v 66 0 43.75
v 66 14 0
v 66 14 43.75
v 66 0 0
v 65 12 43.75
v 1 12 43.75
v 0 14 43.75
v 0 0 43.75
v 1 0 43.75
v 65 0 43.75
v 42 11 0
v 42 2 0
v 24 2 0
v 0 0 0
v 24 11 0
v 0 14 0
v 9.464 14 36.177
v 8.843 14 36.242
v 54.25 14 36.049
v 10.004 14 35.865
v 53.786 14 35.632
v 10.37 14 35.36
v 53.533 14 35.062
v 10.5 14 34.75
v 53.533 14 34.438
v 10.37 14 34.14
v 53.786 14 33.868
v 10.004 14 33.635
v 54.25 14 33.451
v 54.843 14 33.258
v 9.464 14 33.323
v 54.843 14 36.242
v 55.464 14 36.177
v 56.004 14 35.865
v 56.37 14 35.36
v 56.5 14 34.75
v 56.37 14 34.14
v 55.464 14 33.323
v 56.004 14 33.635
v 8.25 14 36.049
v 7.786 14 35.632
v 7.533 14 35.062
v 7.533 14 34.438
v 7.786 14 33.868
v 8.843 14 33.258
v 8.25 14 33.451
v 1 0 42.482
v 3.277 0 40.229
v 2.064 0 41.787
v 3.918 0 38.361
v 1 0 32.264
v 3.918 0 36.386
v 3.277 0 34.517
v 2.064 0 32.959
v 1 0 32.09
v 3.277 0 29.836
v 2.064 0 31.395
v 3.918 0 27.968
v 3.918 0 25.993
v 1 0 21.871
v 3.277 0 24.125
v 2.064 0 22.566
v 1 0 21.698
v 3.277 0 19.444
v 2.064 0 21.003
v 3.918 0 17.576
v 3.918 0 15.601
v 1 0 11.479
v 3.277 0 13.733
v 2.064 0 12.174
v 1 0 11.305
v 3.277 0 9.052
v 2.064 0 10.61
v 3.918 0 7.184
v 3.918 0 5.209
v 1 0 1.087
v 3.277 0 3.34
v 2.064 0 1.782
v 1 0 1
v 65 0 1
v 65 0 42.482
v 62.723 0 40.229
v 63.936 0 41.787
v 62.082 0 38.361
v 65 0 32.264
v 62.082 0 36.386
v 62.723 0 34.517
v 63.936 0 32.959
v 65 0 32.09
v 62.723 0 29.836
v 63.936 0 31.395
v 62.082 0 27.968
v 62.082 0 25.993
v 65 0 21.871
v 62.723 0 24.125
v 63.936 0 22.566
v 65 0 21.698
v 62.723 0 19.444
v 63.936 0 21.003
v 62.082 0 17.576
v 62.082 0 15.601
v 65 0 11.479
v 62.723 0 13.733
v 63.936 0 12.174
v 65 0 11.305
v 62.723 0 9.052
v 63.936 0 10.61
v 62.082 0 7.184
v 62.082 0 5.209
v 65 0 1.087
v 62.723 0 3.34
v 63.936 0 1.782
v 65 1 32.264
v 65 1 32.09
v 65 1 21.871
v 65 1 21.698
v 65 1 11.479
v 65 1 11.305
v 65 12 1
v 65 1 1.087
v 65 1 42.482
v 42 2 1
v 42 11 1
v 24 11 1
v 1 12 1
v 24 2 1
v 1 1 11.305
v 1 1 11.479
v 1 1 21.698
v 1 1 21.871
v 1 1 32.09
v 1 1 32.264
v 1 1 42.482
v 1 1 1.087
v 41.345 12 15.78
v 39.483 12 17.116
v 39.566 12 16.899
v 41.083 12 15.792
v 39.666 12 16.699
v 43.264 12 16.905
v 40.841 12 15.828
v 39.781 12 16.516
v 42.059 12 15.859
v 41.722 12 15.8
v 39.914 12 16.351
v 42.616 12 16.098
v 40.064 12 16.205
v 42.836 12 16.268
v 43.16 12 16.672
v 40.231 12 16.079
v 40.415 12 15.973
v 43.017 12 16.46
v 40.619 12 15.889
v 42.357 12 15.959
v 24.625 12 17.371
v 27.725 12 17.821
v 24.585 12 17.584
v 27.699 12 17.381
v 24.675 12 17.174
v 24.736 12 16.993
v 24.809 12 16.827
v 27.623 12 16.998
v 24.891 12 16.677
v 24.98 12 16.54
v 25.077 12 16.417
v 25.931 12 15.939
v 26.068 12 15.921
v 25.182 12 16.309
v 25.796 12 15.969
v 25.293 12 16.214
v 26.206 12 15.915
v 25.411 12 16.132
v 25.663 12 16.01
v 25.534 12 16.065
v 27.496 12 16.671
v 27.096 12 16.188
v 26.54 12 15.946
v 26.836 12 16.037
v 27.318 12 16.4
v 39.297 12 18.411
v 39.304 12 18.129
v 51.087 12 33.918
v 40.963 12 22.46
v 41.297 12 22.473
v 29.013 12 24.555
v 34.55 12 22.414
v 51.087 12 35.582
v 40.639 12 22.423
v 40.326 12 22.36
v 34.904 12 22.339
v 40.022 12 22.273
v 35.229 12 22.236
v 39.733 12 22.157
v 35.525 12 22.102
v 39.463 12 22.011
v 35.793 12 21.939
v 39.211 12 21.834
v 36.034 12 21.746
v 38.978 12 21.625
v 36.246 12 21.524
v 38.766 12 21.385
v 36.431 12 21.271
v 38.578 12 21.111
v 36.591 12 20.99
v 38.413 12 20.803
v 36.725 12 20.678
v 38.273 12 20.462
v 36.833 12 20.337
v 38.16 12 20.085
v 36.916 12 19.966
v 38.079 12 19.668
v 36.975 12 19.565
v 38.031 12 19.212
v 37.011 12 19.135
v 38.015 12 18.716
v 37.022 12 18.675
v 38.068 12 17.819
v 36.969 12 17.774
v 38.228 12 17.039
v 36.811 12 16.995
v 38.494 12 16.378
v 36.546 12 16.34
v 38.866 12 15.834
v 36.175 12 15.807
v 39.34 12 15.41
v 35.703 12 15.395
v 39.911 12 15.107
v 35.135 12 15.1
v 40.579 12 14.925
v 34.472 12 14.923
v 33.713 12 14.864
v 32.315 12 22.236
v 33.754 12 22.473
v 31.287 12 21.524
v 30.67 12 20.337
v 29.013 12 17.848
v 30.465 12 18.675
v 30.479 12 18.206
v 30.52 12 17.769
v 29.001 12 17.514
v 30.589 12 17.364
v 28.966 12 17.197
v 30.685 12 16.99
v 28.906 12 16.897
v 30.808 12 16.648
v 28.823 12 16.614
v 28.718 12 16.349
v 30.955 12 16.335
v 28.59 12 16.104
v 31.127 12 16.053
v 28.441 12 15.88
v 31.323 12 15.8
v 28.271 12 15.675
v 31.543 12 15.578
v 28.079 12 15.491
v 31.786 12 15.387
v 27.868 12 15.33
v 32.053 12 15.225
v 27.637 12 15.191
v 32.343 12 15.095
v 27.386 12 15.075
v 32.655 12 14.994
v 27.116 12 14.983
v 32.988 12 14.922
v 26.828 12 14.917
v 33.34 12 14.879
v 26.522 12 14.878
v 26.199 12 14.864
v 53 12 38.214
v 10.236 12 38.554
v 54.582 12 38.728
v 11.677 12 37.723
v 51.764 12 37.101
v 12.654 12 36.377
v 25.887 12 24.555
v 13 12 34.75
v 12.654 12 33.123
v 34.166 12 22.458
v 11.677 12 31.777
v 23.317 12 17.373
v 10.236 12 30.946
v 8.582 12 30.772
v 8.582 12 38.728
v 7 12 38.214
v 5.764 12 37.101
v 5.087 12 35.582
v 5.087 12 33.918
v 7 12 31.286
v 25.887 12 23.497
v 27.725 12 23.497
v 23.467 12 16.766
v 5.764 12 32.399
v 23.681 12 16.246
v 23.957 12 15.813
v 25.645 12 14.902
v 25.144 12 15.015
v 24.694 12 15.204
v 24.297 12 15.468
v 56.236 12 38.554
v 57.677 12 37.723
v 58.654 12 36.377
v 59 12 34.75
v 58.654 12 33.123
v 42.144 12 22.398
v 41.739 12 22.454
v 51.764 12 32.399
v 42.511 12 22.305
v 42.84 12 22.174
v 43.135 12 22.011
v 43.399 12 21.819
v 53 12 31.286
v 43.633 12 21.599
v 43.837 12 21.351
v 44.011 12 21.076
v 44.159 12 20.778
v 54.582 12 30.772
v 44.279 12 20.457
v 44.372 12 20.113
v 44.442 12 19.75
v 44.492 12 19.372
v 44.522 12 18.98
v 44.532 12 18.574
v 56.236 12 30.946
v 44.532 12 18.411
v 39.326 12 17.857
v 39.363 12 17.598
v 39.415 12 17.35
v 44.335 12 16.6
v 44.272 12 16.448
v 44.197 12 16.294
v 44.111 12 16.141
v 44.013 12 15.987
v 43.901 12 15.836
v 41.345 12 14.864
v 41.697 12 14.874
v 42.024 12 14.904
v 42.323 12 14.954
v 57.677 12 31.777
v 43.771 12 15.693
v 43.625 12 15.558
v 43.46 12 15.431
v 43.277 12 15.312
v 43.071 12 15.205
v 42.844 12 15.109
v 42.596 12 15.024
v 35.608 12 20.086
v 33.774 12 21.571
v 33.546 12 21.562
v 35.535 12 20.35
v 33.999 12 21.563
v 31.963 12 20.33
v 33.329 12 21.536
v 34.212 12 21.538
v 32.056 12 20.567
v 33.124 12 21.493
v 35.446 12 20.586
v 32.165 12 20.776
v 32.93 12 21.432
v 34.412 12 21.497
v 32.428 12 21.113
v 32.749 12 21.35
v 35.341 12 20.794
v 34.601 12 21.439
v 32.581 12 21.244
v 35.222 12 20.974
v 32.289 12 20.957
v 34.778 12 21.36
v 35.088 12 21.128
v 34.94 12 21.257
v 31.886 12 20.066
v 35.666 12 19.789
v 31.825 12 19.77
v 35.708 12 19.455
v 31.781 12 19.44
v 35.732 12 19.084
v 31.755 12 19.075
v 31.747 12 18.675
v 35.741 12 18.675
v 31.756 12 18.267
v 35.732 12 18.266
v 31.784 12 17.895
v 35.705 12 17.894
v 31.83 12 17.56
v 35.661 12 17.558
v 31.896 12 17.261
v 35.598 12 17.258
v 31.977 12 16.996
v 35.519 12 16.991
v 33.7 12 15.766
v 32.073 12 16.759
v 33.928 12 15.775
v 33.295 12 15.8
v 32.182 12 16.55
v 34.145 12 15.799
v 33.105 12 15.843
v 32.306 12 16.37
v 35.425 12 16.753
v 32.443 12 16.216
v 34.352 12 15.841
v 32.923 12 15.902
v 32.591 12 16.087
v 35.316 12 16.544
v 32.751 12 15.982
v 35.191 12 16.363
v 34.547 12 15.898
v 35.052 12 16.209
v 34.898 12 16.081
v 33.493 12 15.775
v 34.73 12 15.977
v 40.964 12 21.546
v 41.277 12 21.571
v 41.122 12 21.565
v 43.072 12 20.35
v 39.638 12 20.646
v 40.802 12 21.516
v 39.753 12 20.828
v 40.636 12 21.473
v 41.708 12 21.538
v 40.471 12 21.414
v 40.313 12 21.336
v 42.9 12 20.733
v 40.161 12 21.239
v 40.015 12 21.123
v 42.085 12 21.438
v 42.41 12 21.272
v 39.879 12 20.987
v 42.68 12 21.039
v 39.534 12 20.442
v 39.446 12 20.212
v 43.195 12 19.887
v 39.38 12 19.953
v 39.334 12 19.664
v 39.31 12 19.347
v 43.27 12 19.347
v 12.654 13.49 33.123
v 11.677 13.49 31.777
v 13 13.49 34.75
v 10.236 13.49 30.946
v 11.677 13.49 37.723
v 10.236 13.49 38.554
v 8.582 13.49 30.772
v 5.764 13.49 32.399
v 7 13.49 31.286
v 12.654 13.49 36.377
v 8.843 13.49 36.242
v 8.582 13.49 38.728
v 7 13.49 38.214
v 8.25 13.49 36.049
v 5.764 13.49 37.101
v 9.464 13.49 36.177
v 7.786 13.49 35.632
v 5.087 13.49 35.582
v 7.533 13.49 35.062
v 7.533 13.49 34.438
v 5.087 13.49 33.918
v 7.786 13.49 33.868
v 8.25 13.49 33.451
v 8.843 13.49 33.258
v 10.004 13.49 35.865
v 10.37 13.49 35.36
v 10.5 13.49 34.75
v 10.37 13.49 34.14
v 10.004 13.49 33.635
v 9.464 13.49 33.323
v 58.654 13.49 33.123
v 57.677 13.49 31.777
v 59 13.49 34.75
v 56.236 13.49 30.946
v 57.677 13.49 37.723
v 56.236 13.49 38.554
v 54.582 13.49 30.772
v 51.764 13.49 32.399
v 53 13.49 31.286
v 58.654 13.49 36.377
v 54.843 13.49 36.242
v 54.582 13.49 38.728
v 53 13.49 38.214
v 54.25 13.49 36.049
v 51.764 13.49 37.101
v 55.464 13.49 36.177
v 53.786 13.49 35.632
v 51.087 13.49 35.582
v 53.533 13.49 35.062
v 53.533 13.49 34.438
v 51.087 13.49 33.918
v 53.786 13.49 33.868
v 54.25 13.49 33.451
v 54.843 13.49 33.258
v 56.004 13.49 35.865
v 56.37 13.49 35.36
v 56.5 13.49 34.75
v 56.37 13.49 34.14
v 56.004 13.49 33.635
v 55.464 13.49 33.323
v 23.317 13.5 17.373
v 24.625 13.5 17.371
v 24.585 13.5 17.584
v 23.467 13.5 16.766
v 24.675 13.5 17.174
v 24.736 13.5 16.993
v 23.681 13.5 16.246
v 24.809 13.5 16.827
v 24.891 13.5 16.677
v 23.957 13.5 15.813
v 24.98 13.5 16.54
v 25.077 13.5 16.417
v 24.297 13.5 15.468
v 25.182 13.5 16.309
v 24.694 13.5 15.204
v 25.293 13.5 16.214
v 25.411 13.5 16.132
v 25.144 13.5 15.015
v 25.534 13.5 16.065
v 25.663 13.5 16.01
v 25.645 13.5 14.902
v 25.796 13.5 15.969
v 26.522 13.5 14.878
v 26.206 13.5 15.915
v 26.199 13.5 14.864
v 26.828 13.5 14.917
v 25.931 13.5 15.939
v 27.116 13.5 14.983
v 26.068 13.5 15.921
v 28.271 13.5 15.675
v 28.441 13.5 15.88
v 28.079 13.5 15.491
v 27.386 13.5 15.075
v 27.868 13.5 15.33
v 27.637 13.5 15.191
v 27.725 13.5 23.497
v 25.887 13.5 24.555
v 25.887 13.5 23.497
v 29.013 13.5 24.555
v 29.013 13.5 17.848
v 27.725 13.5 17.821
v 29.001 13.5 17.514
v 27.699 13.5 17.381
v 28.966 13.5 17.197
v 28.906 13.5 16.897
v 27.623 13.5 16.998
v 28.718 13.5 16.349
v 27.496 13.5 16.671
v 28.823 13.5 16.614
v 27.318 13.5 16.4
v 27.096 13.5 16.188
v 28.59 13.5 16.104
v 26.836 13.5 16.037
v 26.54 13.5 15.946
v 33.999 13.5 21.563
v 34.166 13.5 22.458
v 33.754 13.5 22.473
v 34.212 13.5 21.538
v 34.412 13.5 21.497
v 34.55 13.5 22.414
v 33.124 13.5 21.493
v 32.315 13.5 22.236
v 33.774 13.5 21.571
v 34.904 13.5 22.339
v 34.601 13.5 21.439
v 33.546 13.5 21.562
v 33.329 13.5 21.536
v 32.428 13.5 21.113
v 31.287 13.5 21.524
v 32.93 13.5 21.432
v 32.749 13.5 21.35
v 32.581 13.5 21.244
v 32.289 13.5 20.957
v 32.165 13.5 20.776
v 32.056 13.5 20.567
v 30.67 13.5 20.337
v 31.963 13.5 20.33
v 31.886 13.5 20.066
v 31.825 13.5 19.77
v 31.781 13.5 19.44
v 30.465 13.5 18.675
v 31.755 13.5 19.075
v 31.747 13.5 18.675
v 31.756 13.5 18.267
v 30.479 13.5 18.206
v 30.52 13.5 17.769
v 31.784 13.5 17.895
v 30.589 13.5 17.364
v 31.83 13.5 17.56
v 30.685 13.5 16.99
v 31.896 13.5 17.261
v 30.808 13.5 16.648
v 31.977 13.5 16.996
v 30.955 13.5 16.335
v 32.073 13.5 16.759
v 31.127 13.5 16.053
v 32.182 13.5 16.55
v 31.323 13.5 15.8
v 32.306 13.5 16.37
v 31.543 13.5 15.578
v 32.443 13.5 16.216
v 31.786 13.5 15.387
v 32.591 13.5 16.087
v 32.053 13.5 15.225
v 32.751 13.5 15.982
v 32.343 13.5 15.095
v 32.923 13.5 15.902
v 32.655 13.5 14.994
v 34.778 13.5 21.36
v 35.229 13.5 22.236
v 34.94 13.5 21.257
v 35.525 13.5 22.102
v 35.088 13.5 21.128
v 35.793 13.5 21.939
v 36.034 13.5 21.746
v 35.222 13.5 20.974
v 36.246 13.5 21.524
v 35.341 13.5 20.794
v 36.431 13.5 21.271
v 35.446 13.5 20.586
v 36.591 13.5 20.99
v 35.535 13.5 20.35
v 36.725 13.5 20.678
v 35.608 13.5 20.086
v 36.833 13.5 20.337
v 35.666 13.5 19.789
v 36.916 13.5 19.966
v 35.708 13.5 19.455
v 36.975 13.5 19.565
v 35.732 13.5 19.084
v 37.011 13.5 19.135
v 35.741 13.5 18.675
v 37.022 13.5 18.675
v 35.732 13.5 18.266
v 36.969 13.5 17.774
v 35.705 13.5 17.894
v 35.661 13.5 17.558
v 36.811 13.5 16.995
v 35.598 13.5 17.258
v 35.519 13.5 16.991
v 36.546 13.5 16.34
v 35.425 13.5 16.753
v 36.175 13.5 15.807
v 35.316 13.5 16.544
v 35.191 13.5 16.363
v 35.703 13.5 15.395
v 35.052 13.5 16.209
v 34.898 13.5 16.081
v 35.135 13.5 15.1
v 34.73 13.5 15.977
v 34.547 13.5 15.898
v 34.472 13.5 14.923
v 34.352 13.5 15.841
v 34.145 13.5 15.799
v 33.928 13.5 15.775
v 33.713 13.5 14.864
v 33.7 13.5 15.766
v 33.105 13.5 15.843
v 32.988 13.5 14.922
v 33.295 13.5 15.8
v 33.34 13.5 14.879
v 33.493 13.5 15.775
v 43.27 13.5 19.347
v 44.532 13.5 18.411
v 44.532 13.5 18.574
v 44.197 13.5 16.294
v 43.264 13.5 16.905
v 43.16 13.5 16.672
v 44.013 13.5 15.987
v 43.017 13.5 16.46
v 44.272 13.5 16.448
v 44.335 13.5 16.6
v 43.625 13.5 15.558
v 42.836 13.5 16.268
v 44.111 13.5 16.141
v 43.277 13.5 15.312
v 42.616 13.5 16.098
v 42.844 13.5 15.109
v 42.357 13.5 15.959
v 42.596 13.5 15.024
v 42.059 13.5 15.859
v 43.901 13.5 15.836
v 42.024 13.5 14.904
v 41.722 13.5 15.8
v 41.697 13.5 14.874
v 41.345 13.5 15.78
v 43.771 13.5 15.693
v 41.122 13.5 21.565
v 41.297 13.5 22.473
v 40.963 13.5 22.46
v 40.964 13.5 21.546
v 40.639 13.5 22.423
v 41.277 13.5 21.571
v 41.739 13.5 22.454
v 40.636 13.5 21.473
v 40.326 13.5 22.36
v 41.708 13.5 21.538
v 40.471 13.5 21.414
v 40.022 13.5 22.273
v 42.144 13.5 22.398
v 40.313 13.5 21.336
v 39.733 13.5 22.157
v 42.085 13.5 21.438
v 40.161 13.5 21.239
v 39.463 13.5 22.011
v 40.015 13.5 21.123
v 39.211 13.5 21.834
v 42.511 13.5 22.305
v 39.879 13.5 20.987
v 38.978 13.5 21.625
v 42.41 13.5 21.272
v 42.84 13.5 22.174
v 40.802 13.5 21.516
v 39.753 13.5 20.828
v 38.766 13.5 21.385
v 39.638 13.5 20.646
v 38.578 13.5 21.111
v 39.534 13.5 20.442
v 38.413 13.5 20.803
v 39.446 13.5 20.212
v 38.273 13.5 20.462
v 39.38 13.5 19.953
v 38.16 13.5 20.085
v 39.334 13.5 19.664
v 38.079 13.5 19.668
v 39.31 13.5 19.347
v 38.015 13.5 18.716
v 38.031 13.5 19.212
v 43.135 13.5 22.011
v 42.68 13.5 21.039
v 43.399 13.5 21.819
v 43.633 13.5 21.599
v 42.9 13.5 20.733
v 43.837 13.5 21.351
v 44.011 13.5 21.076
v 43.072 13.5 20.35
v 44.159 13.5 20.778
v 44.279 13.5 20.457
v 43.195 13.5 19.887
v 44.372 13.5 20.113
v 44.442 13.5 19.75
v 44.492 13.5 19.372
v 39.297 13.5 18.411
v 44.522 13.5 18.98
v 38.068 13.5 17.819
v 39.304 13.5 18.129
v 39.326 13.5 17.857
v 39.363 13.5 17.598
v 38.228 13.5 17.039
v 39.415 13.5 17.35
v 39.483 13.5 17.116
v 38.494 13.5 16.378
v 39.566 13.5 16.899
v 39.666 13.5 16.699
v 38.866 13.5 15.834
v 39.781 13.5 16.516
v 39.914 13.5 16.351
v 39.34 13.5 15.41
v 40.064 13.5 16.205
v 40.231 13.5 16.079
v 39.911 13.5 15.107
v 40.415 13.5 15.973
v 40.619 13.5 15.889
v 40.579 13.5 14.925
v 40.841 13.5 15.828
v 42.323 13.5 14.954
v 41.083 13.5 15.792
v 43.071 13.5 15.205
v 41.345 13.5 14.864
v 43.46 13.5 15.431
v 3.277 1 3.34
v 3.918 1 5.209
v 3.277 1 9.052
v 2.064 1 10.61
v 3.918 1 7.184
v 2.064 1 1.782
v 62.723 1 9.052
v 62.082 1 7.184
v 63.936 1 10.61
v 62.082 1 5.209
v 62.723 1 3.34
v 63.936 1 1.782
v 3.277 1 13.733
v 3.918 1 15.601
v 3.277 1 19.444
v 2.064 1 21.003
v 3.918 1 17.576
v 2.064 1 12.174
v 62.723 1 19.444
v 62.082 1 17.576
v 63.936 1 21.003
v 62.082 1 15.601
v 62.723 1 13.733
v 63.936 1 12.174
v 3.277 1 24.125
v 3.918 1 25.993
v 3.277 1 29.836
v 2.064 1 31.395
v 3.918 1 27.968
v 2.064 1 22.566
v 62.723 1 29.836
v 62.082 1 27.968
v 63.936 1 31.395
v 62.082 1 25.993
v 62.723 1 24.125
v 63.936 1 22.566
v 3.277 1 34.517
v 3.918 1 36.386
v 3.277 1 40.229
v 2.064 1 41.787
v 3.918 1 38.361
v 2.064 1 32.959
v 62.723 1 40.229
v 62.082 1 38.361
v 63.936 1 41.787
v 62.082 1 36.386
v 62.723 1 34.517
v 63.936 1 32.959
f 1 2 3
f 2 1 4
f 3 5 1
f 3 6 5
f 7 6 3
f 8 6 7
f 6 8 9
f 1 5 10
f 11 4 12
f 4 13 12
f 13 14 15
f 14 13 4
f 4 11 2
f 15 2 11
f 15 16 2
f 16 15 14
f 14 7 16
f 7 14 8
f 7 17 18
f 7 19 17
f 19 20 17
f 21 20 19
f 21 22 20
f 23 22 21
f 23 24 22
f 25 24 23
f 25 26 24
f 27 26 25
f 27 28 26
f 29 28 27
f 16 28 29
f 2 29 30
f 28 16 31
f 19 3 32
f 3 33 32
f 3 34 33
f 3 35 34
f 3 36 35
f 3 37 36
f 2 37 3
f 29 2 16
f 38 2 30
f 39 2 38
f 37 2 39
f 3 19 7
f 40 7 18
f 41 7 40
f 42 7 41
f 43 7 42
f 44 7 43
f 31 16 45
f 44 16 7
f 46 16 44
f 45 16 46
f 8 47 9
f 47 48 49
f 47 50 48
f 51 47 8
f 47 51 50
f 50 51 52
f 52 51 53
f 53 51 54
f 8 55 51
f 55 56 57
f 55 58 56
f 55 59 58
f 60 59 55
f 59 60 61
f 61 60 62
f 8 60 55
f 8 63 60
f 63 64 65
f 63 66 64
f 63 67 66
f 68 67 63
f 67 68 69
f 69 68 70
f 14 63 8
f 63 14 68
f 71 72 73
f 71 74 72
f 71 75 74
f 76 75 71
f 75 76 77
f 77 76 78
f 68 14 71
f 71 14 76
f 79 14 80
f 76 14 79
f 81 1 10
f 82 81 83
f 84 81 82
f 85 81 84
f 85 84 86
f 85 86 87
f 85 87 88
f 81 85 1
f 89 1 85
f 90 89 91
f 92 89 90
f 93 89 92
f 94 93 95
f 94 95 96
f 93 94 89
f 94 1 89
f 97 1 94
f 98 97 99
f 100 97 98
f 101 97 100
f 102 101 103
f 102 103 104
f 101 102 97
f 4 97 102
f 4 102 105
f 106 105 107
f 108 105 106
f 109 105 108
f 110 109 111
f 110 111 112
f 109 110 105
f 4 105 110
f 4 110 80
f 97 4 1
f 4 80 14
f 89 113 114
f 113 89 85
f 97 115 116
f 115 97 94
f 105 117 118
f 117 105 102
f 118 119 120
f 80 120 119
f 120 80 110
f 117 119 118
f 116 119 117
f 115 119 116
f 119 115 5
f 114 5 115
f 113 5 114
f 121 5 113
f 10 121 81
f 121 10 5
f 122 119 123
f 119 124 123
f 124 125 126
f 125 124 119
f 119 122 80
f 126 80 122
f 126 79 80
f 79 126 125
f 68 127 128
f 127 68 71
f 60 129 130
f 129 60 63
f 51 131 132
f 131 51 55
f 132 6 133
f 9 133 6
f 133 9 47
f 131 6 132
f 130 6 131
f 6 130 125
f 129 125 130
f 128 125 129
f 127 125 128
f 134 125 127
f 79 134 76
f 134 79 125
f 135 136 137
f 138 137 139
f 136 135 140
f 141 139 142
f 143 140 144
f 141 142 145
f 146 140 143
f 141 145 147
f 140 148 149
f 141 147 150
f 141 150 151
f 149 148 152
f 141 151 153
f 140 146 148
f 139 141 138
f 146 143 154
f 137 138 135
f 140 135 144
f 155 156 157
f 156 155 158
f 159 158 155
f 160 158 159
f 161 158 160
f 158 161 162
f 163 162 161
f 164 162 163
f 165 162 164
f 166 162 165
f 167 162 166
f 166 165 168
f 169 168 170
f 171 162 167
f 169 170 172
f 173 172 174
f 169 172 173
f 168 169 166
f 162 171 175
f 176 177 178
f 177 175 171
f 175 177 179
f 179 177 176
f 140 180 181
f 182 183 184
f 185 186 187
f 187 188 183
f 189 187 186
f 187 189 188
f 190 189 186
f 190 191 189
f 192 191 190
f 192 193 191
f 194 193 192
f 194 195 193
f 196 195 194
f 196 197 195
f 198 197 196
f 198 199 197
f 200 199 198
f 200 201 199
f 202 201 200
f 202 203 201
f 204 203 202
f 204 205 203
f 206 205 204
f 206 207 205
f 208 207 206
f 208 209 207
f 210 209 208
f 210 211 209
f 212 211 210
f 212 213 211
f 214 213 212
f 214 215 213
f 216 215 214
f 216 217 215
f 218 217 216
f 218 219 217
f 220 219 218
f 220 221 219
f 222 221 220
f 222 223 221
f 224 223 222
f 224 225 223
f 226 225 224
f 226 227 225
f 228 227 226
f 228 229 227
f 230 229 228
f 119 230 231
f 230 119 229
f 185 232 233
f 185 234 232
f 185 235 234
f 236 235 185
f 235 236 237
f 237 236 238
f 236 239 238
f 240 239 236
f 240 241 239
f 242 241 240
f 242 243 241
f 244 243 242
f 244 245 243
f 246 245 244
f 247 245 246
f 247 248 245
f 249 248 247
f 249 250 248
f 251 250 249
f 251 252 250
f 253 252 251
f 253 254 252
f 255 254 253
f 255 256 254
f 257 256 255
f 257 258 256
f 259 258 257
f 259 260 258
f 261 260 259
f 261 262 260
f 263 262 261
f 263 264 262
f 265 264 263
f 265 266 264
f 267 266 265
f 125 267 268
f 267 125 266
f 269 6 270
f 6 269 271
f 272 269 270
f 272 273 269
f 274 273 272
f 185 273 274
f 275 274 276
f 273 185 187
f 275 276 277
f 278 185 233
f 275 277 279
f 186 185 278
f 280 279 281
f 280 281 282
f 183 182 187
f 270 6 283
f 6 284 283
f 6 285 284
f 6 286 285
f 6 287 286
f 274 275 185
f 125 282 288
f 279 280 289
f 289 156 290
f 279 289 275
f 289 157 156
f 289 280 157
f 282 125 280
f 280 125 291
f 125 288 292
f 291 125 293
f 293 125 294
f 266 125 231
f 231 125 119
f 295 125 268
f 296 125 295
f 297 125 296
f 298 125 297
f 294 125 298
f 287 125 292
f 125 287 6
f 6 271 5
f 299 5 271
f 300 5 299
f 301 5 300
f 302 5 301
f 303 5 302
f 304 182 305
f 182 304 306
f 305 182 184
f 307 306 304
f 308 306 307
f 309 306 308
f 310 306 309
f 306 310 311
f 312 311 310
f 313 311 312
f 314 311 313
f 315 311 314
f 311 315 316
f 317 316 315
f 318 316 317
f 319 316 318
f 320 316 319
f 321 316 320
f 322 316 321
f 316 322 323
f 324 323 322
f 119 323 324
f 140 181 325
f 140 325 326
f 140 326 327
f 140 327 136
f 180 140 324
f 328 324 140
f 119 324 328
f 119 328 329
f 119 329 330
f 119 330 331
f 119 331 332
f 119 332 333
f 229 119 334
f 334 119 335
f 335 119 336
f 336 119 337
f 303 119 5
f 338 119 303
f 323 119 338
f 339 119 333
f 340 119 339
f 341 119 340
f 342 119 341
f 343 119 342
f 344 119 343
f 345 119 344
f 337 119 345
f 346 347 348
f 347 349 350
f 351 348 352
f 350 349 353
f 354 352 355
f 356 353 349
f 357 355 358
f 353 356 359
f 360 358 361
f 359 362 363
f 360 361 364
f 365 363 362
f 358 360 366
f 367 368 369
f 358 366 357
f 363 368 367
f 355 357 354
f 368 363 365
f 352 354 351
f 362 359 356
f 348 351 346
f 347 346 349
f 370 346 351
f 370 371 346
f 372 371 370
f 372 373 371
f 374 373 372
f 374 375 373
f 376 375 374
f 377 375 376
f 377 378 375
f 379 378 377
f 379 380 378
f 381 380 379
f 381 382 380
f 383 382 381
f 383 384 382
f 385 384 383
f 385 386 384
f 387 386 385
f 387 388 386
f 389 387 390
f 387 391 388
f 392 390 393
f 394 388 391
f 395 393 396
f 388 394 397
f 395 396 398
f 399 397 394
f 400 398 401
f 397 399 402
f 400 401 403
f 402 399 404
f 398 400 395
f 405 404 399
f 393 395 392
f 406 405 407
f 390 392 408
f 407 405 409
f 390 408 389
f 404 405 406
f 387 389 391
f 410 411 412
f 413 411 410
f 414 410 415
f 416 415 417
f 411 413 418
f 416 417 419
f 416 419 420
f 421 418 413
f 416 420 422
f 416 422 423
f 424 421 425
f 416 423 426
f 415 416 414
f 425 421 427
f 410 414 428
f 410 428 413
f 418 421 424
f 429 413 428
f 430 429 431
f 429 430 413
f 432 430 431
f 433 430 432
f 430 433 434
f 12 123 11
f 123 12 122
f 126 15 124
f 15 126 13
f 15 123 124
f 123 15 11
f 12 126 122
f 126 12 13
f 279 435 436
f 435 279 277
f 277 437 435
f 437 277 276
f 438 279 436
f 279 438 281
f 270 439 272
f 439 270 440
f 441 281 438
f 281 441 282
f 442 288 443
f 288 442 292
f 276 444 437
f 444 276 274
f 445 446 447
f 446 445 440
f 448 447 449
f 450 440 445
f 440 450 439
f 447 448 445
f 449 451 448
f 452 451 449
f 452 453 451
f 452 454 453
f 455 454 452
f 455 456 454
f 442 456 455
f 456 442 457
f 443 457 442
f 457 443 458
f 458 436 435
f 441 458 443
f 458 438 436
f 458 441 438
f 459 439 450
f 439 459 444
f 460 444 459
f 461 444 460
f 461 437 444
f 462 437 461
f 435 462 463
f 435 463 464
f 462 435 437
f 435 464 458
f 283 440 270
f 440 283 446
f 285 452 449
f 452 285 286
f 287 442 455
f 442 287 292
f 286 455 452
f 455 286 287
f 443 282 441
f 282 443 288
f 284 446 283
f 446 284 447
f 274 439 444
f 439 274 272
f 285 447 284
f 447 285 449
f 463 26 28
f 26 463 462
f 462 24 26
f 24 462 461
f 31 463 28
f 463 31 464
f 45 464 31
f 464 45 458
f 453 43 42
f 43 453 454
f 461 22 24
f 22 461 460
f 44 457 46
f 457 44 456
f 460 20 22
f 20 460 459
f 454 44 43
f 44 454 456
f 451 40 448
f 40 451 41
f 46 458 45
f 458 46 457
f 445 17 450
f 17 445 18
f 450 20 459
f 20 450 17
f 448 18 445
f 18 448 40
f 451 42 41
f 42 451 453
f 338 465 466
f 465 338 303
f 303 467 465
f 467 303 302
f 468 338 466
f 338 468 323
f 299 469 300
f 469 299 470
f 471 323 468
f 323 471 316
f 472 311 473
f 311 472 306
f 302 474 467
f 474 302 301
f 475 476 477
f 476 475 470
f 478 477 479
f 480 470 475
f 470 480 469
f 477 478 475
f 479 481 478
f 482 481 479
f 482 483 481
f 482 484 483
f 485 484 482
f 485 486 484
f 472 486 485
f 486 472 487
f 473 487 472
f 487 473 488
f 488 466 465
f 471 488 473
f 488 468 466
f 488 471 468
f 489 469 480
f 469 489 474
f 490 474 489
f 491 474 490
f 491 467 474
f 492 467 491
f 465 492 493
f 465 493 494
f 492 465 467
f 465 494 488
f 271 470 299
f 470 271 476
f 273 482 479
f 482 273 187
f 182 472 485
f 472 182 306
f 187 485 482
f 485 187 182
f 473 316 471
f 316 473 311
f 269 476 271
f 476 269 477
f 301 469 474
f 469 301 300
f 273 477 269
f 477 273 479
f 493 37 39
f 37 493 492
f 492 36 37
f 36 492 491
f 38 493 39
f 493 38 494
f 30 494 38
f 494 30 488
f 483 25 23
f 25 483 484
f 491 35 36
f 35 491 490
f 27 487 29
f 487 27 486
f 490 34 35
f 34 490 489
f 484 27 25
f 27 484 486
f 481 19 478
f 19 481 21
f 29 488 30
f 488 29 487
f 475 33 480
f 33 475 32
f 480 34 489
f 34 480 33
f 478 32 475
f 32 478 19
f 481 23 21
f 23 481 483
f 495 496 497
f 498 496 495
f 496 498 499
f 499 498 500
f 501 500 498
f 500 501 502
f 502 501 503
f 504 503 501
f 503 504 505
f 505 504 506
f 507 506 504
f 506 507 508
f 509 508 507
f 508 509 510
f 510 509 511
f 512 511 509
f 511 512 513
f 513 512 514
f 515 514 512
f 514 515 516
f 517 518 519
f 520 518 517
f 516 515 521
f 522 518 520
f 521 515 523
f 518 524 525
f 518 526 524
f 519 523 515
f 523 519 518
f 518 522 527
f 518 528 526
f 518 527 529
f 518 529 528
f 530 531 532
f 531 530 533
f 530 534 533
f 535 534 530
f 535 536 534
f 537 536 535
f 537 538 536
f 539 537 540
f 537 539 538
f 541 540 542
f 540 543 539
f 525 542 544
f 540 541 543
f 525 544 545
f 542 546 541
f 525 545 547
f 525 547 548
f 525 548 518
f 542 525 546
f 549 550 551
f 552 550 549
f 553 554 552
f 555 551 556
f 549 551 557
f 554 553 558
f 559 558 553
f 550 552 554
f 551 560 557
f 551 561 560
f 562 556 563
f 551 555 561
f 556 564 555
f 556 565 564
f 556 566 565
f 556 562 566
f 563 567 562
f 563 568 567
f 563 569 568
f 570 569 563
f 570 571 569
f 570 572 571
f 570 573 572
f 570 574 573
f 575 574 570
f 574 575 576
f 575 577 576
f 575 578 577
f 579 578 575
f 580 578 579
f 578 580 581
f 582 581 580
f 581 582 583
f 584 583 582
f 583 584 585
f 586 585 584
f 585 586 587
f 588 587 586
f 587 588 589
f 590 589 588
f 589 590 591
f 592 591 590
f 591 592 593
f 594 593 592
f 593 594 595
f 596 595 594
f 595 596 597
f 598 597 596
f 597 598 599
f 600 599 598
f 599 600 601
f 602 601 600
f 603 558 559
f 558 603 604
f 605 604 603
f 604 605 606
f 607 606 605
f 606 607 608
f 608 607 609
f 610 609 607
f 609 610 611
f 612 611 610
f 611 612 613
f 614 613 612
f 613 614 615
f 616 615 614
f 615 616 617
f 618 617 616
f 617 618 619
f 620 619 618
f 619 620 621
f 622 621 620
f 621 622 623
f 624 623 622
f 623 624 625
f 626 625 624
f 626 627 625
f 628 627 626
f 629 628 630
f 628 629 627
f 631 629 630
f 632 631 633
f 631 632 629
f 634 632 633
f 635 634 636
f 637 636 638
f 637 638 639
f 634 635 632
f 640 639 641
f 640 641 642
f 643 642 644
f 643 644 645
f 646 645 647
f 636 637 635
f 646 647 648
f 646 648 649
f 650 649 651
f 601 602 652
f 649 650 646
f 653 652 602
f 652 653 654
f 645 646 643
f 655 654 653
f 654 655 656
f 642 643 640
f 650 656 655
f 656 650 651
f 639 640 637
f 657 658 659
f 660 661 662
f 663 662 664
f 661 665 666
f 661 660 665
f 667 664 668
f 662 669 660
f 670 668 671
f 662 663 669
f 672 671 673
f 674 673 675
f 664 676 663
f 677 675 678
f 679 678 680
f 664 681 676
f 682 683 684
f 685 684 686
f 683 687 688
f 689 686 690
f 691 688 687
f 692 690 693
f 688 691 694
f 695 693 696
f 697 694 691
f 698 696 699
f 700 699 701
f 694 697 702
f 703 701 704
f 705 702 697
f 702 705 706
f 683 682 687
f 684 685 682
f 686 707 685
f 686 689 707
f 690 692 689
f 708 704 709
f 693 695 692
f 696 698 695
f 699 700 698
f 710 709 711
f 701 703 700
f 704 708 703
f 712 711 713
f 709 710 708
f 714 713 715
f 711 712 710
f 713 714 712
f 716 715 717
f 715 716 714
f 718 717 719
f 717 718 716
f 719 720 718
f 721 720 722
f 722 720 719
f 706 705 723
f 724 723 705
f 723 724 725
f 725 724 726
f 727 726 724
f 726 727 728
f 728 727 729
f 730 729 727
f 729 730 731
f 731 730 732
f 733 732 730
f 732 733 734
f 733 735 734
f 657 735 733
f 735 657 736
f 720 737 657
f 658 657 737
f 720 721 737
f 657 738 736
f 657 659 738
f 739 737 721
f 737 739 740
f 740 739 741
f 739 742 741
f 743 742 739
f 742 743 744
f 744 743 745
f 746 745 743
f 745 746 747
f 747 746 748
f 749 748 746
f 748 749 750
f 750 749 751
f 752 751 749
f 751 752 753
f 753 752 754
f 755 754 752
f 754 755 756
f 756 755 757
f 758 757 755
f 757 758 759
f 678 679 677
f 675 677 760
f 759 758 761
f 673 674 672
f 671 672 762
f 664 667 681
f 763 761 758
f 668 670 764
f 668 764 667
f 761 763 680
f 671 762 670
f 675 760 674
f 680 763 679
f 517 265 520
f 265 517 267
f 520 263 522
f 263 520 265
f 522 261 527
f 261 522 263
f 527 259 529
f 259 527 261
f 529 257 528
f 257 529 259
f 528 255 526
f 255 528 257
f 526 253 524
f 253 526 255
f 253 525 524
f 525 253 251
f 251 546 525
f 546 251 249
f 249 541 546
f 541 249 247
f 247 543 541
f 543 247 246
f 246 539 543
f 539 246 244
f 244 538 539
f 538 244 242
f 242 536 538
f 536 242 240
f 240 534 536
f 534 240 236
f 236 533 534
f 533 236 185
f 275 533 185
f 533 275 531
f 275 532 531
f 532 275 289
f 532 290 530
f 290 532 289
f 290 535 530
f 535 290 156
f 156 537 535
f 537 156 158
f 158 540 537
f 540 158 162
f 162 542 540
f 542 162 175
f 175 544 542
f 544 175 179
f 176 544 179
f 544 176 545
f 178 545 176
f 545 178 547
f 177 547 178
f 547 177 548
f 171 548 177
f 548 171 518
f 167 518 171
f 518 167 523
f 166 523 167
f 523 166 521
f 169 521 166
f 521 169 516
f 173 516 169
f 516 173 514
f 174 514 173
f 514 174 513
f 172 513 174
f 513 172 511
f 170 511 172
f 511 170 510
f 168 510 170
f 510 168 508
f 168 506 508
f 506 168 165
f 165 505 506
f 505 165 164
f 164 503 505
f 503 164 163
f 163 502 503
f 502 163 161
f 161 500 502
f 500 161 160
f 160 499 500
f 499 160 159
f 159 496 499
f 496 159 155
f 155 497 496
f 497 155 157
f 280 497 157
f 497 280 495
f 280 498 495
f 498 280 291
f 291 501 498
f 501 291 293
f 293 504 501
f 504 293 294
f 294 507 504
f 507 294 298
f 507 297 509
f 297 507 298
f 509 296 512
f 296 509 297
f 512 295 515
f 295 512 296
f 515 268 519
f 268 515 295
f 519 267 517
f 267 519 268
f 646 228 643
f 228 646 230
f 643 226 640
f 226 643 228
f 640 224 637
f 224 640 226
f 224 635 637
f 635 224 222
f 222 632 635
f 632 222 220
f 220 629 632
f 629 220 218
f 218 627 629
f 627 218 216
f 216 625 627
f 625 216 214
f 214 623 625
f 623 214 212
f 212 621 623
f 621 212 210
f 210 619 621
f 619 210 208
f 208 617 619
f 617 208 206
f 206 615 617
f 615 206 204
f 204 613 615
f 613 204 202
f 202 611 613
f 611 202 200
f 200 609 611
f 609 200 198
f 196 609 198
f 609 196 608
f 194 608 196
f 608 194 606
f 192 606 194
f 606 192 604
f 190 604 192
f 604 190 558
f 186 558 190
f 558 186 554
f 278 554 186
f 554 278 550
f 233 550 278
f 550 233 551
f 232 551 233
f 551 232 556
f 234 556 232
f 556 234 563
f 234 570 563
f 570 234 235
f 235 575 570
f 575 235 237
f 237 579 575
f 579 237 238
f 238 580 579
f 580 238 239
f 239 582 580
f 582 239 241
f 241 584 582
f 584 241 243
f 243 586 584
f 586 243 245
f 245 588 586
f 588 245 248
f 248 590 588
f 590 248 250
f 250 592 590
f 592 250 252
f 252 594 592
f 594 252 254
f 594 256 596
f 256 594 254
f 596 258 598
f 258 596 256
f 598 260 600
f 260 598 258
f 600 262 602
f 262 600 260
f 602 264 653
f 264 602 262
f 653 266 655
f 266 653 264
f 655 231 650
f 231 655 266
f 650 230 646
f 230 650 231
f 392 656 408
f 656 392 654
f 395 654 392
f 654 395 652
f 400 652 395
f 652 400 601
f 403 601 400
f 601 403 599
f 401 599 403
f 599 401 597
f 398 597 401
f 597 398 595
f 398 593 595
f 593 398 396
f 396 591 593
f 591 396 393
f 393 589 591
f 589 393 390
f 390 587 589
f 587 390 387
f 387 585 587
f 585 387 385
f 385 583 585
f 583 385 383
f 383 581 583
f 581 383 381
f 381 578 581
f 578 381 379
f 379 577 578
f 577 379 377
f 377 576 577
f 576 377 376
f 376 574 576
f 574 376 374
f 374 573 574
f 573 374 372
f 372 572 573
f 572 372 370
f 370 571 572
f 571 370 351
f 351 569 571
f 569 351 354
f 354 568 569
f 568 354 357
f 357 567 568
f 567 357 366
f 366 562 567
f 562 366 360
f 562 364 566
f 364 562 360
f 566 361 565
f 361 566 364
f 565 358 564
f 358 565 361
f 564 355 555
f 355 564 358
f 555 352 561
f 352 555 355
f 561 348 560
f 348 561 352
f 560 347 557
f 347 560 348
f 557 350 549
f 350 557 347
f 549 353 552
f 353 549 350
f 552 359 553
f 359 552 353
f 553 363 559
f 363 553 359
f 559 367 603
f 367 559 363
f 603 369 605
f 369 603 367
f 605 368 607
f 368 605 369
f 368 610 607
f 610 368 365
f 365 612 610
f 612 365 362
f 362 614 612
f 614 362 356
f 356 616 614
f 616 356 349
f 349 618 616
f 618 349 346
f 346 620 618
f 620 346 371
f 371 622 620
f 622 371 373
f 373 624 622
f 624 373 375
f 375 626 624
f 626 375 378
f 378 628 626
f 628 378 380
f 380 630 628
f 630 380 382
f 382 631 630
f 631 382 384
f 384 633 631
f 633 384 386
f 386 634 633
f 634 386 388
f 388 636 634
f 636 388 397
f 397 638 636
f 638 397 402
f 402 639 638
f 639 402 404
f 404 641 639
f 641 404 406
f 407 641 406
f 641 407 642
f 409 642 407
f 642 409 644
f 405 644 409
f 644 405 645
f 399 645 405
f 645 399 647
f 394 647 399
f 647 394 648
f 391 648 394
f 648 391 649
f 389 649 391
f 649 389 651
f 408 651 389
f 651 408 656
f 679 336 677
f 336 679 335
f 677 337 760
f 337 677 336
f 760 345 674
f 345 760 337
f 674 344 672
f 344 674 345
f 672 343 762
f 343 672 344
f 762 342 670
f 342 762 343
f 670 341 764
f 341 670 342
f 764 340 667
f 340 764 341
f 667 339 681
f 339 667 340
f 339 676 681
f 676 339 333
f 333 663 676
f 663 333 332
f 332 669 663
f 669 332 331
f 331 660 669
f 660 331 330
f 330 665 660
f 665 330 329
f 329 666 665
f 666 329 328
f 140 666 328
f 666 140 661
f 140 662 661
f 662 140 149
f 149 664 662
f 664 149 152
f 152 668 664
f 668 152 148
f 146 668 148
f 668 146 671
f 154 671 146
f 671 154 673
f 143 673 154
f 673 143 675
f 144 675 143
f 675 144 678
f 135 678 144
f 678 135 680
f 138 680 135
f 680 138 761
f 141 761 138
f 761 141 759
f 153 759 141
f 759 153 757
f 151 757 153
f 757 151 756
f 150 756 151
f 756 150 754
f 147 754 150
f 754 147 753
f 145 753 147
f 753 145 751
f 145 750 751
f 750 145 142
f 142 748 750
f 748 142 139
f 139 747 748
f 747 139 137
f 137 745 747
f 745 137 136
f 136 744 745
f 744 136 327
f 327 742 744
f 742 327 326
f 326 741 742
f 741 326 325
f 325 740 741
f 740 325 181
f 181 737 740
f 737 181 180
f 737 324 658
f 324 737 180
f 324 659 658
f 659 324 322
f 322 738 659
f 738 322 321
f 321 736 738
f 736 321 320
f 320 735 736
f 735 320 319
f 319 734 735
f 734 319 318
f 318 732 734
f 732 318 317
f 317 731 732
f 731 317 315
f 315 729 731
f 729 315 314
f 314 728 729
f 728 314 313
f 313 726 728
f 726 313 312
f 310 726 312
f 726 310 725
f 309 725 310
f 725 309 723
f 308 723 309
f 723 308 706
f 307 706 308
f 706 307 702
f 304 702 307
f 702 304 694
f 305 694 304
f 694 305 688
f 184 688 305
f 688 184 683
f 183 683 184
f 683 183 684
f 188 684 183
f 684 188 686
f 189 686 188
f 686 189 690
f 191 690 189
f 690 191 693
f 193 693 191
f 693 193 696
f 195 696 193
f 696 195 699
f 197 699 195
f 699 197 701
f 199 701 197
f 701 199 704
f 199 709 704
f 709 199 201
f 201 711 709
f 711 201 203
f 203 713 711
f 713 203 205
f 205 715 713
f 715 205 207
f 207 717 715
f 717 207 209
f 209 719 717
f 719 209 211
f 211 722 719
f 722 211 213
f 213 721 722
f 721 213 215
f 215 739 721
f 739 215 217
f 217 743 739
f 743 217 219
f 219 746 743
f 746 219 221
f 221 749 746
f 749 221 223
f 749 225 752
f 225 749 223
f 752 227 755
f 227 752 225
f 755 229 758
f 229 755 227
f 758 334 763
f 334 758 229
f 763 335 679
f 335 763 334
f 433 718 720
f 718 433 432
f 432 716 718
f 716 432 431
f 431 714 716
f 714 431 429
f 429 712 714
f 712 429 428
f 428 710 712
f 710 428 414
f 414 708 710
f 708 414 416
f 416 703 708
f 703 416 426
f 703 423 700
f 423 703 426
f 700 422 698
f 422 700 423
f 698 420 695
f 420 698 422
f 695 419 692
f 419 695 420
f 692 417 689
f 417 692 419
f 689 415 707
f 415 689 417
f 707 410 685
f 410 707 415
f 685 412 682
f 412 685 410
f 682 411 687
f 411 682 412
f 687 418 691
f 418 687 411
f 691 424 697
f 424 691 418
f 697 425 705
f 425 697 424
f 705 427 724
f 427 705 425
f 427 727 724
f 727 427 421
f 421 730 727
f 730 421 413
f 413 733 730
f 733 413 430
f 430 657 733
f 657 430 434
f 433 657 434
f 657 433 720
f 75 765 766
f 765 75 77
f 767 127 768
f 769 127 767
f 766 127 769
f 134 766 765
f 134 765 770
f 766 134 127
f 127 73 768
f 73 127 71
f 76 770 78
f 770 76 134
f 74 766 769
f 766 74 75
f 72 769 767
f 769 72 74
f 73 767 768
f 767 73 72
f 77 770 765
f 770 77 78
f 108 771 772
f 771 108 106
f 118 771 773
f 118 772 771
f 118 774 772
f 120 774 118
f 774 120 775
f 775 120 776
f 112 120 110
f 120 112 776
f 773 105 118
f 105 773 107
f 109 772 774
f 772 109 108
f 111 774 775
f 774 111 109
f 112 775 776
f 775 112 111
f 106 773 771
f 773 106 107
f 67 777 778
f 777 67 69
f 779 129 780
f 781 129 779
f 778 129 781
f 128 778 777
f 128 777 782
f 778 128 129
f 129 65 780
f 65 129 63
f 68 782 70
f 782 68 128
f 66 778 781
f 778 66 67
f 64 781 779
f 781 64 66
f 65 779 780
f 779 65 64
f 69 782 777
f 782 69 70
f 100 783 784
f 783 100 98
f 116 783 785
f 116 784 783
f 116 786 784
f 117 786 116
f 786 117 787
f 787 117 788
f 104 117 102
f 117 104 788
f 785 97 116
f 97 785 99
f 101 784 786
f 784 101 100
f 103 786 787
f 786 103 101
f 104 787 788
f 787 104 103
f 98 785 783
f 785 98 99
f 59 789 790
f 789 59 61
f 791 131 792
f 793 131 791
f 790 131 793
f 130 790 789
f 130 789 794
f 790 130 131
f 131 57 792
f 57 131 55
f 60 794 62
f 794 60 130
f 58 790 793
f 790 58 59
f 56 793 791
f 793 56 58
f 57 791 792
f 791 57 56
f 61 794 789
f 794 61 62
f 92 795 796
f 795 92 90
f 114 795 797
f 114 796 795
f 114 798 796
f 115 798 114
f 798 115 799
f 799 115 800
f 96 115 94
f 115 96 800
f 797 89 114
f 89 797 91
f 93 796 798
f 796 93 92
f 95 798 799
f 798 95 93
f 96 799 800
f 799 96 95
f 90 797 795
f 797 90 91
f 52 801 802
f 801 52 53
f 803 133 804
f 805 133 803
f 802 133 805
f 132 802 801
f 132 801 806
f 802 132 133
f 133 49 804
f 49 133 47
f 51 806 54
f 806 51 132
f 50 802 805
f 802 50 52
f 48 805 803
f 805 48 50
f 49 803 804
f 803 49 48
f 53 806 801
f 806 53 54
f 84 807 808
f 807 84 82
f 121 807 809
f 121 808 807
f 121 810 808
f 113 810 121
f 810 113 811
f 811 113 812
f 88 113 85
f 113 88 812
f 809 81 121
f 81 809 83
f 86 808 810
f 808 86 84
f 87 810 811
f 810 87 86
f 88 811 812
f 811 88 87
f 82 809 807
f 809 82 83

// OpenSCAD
// Internal width of holder - your phone/tablet's width, plus 2 or so (mm)
holder_width = 64;
// "Internal" height of the holder (mm). Can be as short or tall as you want.
holder_height = 42.75;
// Internal depth of the dock - your phone/tablet's depth + a mm or so
holder_depth = 11;
// Depth of the plug hole in mm
hole_width = 18;
// Width of the plug hole in mm
hole_depth = 9;
// Left / right side wall thickness in mm
side_thickness = 1;
// Thickness of back plate in mm.
back_thickness = 2;
// Thickness of front plate in mm.
front_thickness = 1;
// Thickness of bottom plate in mm.
bottom_thickness = 1;
// Radius of pieces that make up the semicircles that hold the phone in place (mm).
retainer_piece_radius = 6;
// Radius of the mounting indentations, mm.
indentation_radius = 4;
// Depth of the mounting indentations, mm.
indentation_depth = 1.5;
// Mounting screw radius, mm.
hole_radius = 1.5;
// Distance of mounting indents from top, mm
mount_point_from_top = 5;
// Distance of mounting indents from sides, mm.
mount_point_from_side = 5;
// The name to print.
name = "Joe";
// Thickness of name, mm.
name_thickness = 1.5;
// Distance from bottom of dock to bottom of name, mm.
name_bottom_height = 15;
exterior_width = holder_width + (2*side_thickness);
exterior_depth = holder_depth + back_thickness + front_thickness;
exterior_height = holder_height + bottom_thickness;
// To appease OpenSCAD. Please don't modify.
fudge = .01;

module corePiece() {
    difference() {
        cube([exterior_width,exterior_depth,exterior_height]);
        /* Hollow it out */
        translate([side_thickness,0,bottom_thickness]){
            cube([holder_width, holder_depth+front_thickness, holder_height]);
        }
        /* Put in the cord hole */
        translate([(exterior_width - hole_width) / 2,(holder_depth - hole_depth),0]){
            cube([hole_width,hole_depth,(holder_depth - hole_depth)]);
        }
    }
}

module retainerSection() {
    translate([retainer_piece_radius * -0.5,0,0]){
        rotate([90,180,0]){
            intersection() {
                cylinder(r=retainer_piece_radius,h=front_thickness);
                translate([-retainer_piece_radius,-retainer_piece_radius,0]){
                    cube([retainer_piece_radius*0.5,2 * retainer_piece_radius,front_thickness]);
                }
            }
        }
    }
}

module retainer() {
    pieceHeight = 2 * sqrt(.75 * (pow(retainer_piece_radius,2)));
    echo(str("Piece height: ",pieceHeight));
    numPieces = floor((holder_height - bottom_thickness) / pieceHeight);
    echo(str("PIECES: ",numPieces));
    for (pieceNum = [0 : (numPieces - 1)]){
        echo(str("PIECENUM: ",pieceNum));
        translate([side_thickness,front_thickness,bottom_thickness + ((1 + (2 * pieceNum)) *(pieceHeight/2))]){
            retainerSection();
        }
        translate([(side_thickness*2)+holder_width-side_thickness,front_thickness,bottom_thickness + ((1 + (2 * pieceNum)) *(pieceHeight/2))]){
            rotate([0,180,0]){
                retainerSection();
            }
        }
    }
}

module name() {
    x_offset = (exterior_width/2) - (3.3 * len(name));
    translate([x_offset,holder_depth + front_thickness + name_thickness,name_bottom_height]){
        rotate([90,0,0]){
            linear_extrude(height=name_thickness) {
                text(name);
            }
        }
    }
}

module mountingThingy(){
    rotate([-90,0,0]){
        union() {
            cylinder(r=indentation_radius,h=indentation_depth,$fn=15);
            cylinder(r=hole_radius,h=(back_thickness+(2 *fudge)),$fn=15);
        }
    }
}

module mountingThingies(){
    union() {
        translate([indentation_radius + mount_point_from_side,holder_depth+front_thickness-fudge,-indentation_radius + (exterior_height - mount_point_from_top)]){
            mountingThingy();
        }
        translate([-indentation_radius + (holder_width - mount_point_from_side),holder_depth+front_thickness-fudge,-indentation_radius + (exterior_height - mount_point_from_top)]){
            mountingThingy();
        }
    }
}


union() {
    difference(){
       corePiece();
       name();
       mountingThingies();
    }
    retainer();
}
